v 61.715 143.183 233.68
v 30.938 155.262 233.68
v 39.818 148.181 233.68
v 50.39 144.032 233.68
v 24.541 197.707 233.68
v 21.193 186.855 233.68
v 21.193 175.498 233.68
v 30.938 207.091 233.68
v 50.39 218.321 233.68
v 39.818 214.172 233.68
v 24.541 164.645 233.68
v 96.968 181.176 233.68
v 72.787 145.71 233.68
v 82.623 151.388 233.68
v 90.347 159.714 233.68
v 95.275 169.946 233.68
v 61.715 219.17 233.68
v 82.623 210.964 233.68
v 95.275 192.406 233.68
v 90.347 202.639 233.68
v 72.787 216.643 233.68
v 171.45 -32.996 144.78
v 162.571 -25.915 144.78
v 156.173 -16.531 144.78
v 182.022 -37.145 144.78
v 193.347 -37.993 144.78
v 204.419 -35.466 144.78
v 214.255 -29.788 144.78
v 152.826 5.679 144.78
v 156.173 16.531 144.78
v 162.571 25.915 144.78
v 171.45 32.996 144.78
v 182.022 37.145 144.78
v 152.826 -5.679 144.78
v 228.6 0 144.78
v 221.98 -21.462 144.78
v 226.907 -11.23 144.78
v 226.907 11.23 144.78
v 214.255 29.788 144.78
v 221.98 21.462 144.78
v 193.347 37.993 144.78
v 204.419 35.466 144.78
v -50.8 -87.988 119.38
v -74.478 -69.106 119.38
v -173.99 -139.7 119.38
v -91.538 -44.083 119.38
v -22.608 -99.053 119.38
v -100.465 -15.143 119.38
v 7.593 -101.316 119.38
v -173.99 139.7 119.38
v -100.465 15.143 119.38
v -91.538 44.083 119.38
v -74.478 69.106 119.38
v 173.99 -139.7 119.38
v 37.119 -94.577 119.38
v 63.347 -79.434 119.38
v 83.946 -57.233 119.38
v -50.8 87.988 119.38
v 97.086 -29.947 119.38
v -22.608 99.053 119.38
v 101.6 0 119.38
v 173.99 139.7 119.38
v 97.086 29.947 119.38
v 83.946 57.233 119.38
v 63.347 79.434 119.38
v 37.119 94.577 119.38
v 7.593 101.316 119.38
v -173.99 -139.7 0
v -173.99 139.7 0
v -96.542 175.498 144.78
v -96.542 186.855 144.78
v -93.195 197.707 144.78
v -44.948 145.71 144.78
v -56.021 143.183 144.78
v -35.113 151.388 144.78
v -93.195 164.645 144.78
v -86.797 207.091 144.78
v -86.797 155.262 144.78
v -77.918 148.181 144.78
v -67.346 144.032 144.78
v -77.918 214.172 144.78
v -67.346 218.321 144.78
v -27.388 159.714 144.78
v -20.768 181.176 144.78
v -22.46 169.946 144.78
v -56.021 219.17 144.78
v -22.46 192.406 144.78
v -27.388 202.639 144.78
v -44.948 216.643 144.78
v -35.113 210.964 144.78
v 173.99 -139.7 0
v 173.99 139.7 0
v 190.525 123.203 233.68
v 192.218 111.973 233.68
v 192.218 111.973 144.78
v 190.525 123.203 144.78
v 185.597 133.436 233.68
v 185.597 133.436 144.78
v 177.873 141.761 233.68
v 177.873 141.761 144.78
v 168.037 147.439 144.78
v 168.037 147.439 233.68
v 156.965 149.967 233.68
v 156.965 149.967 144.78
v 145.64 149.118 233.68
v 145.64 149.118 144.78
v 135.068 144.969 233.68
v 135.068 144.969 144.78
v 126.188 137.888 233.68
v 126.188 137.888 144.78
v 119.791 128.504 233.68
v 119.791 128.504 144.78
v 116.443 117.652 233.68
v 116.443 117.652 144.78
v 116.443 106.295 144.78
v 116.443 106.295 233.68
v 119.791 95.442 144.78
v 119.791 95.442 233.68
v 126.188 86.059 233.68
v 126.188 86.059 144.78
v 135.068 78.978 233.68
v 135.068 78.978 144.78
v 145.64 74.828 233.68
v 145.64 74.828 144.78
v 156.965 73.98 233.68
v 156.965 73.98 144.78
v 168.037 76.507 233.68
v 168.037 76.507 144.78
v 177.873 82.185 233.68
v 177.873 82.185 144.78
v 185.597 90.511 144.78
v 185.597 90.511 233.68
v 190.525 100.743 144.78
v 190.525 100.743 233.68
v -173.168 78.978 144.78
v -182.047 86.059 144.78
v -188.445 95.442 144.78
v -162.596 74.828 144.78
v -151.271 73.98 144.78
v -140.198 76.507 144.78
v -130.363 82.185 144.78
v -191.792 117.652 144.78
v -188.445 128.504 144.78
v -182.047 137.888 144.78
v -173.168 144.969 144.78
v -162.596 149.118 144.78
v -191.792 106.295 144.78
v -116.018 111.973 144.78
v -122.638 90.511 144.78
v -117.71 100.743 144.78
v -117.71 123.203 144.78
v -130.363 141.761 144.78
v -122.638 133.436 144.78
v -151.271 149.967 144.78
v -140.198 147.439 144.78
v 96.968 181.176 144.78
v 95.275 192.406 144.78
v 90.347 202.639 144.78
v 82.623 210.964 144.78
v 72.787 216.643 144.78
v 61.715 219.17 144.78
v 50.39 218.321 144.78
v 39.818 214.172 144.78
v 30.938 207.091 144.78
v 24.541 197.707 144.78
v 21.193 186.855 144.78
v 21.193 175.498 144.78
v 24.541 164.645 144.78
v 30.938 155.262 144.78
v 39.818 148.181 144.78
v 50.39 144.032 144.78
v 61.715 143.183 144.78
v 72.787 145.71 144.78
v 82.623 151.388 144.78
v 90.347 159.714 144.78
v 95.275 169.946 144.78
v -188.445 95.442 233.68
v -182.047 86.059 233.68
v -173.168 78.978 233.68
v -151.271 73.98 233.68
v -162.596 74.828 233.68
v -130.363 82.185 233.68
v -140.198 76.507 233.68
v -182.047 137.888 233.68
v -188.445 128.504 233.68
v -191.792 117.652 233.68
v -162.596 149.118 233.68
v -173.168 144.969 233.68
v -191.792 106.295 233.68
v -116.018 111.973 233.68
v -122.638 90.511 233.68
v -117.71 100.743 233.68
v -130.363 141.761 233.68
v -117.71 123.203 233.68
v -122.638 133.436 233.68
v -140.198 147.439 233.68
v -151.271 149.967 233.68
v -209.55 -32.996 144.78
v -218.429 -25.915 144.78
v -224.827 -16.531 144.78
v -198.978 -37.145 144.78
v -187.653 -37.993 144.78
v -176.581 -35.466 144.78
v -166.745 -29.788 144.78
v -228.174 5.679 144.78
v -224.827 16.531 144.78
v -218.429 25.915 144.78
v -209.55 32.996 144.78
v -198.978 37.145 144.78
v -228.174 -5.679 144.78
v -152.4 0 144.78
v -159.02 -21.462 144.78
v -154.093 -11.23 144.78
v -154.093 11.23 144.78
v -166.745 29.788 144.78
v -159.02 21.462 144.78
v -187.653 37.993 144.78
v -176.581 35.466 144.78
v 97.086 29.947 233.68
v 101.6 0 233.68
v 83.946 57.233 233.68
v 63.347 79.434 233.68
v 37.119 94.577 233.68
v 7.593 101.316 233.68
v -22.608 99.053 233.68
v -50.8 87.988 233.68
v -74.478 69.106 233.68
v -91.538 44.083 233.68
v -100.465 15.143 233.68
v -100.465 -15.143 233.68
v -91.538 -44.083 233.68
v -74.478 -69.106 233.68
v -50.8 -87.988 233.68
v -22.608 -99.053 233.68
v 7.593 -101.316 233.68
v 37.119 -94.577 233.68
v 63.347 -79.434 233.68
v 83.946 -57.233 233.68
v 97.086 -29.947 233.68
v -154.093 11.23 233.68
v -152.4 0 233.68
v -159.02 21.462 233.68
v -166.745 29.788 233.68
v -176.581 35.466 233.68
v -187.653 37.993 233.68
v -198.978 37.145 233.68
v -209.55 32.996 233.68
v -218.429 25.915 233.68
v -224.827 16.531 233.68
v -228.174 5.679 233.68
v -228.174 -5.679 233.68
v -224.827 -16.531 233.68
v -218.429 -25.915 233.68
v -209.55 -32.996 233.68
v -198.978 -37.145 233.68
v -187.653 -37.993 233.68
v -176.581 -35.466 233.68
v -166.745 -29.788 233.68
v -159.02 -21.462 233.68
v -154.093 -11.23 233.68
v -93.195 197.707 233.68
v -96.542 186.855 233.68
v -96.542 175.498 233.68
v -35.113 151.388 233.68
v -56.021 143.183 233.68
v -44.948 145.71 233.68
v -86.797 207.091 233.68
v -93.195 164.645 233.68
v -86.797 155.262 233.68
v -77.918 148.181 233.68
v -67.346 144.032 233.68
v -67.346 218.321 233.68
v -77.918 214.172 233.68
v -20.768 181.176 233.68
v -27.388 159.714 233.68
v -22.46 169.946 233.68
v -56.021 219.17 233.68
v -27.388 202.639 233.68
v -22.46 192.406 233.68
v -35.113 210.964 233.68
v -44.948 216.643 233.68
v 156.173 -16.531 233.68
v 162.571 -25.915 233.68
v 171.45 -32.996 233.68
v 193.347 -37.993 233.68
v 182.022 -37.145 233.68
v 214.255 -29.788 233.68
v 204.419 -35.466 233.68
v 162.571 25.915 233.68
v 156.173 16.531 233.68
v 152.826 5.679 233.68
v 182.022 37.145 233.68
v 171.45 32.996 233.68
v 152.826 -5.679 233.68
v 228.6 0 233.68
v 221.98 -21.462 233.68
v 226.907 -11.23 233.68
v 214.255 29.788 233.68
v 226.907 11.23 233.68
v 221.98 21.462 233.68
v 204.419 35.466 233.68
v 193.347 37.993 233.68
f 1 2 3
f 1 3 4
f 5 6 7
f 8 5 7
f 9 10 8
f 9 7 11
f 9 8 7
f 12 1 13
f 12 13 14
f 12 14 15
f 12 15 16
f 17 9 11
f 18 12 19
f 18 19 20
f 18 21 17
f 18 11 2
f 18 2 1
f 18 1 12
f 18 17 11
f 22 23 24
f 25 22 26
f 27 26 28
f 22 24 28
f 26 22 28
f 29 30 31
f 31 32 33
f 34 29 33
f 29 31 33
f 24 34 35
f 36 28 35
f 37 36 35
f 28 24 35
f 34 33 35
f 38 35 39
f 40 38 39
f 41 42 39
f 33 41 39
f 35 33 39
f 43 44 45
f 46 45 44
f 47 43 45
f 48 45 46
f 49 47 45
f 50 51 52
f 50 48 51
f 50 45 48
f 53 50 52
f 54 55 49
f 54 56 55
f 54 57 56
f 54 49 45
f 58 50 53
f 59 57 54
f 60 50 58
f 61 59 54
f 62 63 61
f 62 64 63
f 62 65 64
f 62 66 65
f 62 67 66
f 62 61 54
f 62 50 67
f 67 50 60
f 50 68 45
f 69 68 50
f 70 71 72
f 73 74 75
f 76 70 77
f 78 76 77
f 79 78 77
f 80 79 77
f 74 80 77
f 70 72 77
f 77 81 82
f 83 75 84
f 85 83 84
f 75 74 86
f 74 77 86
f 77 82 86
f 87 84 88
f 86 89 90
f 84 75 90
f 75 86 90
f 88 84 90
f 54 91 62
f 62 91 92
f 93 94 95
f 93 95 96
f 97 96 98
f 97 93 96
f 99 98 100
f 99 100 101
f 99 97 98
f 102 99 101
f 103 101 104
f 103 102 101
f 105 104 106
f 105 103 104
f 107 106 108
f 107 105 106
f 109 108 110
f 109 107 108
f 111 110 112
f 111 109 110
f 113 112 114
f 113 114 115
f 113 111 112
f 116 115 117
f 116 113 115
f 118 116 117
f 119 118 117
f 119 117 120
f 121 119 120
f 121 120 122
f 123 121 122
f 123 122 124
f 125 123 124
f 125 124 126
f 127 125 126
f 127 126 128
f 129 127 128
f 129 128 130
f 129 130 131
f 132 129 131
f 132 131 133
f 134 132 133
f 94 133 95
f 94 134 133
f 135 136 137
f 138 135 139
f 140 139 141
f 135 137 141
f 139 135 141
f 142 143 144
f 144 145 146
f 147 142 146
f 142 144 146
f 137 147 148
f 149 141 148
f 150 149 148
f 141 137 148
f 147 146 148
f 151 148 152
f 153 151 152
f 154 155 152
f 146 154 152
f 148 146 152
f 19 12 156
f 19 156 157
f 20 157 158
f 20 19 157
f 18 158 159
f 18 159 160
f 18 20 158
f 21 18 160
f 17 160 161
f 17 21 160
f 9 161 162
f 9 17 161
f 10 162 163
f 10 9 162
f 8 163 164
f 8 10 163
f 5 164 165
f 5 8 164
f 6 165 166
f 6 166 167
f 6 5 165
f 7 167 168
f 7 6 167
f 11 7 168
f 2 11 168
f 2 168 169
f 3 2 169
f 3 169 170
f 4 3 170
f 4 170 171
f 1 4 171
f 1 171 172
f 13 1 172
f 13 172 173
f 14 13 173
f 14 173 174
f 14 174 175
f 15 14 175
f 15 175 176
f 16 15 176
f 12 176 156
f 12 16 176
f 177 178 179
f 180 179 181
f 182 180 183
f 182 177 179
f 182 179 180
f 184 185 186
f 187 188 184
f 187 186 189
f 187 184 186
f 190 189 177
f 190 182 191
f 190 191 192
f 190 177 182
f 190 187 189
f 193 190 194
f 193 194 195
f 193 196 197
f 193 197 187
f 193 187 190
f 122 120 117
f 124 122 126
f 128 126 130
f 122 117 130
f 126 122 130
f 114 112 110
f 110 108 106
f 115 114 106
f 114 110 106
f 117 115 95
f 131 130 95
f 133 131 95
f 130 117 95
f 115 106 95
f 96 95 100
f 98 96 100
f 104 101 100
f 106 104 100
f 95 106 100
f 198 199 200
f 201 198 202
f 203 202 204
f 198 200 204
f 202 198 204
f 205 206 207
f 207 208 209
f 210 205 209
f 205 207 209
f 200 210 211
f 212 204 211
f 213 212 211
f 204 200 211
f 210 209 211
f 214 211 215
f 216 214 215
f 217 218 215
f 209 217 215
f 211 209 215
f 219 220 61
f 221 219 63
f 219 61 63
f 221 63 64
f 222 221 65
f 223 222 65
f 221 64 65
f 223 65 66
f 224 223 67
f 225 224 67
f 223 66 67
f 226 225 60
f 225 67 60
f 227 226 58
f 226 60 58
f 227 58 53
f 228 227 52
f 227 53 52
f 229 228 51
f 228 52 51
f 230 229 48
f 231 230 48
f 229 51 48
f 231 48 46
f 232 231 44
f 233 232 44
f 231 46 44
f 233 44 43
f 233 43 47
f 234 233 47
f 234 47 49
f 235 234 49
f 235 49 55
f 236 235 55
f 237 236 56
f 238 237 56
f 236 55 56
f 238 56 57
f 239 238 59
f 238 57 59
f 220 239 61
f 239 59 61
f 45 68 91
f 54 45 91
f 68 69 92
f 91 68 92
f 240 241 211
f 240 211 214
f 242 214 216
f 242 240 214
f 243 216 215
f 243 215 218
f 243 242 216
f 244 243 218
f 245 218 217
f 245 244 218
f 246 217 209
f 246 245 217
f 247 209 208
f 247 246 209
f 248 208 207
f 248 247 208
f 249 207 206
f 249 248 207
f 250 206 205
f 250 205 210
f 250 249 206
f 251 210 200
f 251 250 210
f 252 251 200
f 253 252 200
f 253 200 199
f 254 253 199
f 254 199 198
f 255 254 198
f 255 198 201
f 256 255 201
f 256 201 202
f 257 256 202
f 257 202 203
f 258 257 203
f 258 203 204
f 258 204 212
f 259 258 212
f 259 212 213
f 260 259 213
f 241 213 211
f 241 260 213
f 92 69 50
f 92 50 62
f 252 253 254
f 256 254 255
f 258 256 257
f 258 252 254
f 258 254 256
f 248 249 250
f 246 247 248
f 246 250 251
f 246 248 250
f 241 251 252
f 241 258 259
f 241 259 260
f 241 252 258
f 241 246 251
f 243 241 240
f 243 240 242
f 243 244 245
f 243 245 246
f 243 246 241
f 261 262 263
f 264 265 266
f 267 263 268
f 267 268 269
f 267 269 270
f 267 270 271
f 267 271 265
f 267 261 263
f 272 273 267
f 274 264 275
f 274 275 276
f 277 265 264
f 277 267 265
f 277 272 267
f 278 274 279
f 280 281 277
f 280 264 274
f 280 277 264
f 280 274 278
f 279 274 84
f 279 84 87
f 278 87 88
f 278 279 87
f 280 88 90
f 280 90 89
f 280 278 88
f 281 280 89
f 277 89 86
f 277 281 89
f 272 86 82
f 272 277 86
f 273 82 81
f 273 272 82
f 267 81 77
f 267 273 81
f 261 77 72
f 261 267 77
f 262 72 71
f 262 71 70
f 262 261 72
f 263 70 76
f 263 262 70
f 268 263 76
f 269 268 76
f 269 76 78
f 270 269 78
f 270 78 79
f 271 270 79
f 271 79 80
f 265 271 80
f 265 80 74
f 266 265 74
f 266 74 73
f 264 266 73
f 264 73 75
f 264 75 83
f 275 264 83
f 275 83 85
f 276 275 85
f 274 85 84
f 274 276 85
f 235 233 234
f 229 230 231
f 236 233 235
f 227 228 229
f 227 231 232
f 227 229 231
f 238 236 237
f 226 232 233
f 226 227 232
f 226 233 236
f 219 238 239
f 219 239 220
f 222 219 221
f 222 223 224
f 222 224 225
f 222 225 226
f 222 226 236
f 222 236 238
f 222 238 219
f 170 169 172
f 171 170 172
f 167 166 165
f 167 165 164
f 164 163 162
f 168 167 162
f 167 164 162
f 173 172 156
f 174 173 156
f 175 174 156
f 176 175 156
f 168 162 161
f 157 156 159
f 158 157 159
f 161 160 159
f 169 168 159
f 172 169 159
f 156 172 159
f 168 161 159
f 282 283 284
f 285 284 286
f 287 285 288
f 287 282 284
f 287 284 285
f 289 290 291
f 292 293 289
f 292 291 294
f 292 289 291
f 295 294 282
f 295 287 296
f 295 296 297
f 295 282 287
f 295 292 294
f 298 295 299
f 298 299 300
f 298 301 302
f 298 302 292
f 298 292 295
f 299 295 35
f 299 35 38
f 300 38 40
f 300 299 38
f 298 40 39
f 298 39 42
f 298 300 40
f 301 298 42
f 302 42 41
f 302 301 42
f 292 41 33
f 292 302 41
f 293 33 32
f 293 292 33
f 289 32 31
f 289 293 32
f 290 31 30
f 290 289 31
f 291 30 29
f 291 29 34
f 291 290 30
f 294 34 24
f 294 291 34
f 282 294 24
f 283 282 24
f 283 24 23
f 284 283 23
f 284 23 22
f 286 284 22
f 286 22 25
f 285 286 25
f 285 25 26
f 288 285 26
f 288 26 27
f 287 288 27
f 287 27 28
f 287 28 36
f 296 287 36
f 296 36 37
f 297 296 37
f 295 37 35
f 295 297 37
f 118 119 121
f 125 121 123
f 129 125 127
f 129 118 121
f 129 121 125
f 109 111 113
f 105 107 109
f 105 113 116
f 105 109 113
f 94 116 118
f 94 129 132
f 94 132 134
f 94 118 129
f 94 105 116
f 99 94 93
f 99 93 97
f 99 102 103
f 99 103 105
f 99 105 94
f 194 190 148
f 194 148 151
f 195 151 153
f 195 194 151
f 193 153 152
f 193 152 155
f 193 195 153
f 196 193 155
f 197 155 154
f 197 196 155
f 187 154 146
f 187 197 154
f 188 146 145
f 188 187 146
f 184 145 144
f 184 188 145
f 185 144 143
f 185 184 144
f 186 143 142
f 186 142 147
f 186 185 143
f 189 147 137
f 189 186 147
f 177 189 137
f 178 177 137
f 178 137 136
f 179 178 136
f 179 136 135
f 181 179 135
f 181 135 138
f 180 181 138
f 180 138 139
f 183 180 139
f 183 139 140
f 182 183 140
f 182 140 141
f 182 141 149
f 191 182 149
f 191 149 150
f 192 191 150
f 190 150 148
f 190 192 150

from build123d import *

# Parameters (mm, degrees)
F0_W     = 347.98
F0_H     = 279.4
F1_DEPTH = 119.38
F2_R     = 101.6
F3_DEPTH = 114.3
F4_R     = 38.1
F5_DEPTH = 88.9


with BuildPart() as f1:
    # F0 (on Top) → F1 (new body)
    with BuildSketch(Plane.XY):
        Rectangle(F0_W, F0_H)
    extrude(amount=F1_DEPTH)

    # F2 (on face) → F3 (join)
    with BuildSketch(Plane.XY.offset(119.38)):
        Circle(F2_R)
    extrude(amount=F3_DEPTH)


with BuildPart() as f5:
    # F4 (on face) → F5 (new body)
    with BuildSketch(Plane.XY.offset(233.68)):
        with Locations((-190.5, 0)):
            Circle(F4_R)
        with Locations((-154.117737, 111.973091)):
            Circle(F4_R)
        with Locations((-58.867737, 181.176266)):
            Circle(F4_R)
        with Locations((58.867737, 181.176266)):
            Circle(F4_R)
        with Locations((154.117737, 111.973091)):
            Circle(F4_R)
        with Locations((190.5, 0)):
            Circle(F4_R)
    extrude(amount=-F5_DEPTH)


solid = Compound([f1.part, f5.part])
